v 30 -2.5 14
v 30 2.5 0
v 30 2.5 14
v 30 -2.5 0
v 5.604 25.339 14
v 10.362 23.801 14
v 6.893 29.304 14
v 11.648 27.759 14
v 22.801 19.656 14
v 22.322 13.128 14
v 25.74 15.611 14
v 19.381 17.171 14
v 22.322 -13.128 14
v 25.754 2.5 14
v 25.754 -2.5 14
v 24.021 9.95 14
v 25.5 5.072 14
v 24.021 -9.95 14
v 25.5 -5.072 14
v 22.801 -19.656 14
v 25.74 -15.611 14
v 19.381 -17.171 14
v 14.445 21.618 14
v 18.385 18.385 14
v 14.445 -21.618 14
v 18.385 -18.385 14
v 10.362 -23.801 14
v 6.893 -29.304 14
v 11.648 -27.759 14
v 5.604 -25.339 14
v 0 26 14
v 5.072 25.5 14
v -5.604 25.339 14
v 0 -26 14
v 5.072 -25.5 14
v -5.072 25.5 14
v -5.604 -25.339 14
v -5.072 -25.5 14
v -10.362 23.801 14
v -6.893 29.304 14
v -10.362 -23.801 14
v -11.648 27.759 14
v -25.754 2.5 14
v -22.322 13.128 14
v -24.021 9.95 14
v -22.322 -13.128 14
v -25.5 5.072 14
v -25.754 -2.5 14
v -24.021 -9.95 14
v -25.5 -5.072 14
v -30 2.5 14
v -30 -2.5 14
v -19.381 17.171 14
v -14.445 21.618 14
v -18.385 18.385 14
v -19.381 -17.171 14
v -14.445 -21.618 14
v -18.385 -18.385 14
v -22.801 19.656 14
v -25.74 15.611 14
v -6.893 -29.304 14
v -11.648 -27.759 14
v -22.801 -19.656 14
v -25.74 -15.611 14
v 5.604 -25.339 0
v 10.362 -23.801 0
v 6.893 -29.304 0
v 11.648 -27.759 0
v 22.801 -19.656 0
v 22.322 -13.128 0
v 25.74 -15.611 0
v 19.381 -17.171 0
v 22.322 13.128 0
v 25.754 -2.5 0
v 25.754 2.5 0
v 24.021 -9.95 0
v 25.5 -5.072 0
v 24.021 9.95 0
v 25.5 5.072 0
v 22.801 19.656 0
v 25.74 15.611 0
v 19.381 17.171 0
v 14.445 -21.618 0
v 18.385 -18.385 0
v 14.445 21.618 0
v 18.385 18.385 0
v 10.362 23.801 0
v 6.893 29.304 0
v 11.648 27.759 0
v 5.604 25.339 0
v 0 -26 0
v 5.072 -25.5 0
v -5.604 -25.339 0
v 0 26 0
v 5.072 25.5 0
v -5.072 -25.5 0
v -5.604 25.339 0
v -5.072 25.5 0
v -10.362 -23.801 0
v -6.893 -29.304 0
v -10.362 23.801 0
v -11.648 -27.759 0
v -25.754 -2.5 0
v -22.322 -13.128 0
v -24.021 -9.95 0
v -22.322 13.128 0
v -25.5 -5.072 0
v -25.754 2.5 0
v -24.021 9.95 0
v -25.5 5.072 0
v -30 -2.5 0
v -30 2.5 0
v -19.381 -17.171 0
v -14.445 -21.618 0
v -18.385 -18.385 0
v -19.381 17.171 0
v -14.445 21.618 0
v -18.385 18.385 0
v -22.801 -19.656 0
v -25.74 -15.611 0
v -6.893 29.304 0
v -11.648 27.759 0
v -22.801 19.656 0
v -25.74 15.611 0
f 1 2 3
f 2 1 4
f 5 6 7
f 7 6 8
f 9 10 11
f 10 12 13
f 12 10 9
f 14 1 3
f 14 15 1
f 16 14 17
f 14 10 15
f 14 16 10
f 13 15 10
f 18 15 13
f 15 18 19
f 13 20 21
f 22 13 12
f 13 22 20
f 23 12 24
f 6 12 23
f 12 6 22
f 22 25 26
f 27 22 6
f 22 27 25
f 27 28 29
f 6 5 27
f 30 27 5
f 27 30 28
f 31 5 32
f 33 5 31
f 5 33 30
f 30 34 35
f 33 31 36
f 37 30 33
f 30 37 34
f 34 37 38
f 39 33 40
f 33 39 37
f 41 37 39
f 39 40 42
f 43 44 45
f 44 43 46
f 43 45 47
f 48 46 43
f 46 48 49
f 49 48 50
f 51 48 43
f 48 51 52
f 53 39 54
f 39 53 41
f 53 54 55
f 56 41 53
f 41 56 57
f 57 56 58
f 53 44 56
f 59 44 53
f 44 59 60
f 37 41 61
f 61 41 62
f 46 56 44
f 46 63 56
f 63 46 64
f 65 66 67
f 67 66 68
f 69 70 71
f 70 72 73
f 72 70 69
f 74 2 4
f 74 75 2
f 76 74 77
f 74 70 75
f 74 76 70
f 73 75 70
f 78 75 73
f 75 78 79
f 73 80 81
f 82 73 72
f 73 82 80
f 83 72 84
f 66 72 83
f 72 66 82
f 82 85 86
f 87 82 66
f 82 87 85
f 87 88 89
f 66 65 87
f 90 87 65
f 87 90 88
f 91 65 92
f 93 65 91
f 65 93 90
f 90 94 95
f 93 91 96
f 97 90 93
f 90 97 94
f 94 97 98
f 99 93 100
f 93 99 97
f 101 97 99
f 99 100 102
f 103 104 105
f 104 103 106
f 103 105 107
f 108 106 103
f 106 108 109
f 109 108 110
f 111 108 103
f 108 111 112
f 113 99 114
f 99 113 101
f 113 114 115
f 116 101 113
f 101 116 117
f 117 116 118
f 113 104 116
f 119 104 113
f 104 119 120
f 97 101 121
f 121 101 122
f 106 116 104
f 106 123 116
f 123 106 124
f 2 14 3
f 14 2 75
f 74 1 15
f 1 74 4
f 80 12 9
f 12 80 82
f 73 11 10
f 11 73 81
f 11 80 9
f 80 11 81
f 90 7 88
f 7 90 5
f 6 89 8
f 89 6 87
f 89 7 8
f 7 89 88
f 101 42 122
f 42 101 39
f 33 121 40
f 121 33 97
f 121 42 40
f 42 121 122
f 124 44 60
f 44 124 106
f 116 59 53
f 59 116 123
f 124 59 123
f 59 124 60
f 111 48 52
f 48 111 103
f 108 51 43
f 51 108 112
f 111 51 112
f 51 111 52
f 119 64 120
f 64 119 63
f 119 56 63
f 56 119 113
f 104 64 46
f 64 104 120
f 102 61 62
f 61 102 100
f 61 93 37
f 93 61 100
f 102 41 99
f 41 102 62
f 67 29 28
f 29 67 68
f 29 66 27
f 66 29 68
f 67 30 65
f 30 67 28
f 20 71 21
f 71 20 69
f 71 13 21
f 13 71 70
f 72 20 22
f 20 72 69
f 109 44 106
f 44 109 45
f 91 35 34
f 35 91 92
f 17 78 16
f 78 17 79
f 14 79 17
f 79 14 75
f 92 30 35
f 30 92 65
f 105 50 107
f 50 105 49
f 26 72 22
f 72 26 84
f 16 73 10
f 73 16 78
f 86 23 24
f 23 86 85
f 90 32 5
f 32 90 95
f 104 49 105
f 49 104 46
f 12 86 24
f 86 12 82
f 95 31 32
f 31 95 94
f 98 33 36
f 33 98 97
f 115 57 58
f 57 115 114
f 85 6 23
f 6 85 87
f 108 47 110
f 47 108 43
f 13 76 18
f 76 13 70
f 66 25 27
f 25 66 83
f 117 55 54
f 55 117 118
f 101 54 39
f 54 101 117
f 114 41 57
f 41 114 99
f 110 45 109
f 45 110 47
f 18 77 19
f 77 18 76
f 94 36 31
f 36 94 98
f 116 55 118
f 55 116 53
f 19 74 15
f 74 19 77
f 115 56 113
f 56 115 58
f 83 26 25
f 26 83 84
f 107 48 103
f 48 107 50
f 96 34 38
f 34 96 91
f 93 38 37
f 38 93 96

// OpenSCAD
$fn = 32;

// ----------------------------------------------------------------------
// Spur blank: plain gear blank
// ----------------------------------------------------------------------

// --- parameters (mm) ---
disc_r = 26;              // blank root radius
disc_t = 14;              // blank thickness
n_teeth = 10;             // stub tooth count
tooth_w = 5;              // tooth width at the root
tooth_h = 4;              // tooth height above the root

out_r = disc_r + tooth_h;  // tip radius
bbox_x = 60.0;  // measured width over the teeth
bbox_y = 58.61;  // measured depth over the teeth

union() {
  cylinder(r = disc_r, h = disc_t);
  for (i = [0 : n_teeth - 1])
    rotate([0, 0, i * 360 / n_teeth])
      translate([disc_r - 1, -tooth_w / 2, 0])
        cube([tooth_h + 1, tooth_w, disc_t]);
}
